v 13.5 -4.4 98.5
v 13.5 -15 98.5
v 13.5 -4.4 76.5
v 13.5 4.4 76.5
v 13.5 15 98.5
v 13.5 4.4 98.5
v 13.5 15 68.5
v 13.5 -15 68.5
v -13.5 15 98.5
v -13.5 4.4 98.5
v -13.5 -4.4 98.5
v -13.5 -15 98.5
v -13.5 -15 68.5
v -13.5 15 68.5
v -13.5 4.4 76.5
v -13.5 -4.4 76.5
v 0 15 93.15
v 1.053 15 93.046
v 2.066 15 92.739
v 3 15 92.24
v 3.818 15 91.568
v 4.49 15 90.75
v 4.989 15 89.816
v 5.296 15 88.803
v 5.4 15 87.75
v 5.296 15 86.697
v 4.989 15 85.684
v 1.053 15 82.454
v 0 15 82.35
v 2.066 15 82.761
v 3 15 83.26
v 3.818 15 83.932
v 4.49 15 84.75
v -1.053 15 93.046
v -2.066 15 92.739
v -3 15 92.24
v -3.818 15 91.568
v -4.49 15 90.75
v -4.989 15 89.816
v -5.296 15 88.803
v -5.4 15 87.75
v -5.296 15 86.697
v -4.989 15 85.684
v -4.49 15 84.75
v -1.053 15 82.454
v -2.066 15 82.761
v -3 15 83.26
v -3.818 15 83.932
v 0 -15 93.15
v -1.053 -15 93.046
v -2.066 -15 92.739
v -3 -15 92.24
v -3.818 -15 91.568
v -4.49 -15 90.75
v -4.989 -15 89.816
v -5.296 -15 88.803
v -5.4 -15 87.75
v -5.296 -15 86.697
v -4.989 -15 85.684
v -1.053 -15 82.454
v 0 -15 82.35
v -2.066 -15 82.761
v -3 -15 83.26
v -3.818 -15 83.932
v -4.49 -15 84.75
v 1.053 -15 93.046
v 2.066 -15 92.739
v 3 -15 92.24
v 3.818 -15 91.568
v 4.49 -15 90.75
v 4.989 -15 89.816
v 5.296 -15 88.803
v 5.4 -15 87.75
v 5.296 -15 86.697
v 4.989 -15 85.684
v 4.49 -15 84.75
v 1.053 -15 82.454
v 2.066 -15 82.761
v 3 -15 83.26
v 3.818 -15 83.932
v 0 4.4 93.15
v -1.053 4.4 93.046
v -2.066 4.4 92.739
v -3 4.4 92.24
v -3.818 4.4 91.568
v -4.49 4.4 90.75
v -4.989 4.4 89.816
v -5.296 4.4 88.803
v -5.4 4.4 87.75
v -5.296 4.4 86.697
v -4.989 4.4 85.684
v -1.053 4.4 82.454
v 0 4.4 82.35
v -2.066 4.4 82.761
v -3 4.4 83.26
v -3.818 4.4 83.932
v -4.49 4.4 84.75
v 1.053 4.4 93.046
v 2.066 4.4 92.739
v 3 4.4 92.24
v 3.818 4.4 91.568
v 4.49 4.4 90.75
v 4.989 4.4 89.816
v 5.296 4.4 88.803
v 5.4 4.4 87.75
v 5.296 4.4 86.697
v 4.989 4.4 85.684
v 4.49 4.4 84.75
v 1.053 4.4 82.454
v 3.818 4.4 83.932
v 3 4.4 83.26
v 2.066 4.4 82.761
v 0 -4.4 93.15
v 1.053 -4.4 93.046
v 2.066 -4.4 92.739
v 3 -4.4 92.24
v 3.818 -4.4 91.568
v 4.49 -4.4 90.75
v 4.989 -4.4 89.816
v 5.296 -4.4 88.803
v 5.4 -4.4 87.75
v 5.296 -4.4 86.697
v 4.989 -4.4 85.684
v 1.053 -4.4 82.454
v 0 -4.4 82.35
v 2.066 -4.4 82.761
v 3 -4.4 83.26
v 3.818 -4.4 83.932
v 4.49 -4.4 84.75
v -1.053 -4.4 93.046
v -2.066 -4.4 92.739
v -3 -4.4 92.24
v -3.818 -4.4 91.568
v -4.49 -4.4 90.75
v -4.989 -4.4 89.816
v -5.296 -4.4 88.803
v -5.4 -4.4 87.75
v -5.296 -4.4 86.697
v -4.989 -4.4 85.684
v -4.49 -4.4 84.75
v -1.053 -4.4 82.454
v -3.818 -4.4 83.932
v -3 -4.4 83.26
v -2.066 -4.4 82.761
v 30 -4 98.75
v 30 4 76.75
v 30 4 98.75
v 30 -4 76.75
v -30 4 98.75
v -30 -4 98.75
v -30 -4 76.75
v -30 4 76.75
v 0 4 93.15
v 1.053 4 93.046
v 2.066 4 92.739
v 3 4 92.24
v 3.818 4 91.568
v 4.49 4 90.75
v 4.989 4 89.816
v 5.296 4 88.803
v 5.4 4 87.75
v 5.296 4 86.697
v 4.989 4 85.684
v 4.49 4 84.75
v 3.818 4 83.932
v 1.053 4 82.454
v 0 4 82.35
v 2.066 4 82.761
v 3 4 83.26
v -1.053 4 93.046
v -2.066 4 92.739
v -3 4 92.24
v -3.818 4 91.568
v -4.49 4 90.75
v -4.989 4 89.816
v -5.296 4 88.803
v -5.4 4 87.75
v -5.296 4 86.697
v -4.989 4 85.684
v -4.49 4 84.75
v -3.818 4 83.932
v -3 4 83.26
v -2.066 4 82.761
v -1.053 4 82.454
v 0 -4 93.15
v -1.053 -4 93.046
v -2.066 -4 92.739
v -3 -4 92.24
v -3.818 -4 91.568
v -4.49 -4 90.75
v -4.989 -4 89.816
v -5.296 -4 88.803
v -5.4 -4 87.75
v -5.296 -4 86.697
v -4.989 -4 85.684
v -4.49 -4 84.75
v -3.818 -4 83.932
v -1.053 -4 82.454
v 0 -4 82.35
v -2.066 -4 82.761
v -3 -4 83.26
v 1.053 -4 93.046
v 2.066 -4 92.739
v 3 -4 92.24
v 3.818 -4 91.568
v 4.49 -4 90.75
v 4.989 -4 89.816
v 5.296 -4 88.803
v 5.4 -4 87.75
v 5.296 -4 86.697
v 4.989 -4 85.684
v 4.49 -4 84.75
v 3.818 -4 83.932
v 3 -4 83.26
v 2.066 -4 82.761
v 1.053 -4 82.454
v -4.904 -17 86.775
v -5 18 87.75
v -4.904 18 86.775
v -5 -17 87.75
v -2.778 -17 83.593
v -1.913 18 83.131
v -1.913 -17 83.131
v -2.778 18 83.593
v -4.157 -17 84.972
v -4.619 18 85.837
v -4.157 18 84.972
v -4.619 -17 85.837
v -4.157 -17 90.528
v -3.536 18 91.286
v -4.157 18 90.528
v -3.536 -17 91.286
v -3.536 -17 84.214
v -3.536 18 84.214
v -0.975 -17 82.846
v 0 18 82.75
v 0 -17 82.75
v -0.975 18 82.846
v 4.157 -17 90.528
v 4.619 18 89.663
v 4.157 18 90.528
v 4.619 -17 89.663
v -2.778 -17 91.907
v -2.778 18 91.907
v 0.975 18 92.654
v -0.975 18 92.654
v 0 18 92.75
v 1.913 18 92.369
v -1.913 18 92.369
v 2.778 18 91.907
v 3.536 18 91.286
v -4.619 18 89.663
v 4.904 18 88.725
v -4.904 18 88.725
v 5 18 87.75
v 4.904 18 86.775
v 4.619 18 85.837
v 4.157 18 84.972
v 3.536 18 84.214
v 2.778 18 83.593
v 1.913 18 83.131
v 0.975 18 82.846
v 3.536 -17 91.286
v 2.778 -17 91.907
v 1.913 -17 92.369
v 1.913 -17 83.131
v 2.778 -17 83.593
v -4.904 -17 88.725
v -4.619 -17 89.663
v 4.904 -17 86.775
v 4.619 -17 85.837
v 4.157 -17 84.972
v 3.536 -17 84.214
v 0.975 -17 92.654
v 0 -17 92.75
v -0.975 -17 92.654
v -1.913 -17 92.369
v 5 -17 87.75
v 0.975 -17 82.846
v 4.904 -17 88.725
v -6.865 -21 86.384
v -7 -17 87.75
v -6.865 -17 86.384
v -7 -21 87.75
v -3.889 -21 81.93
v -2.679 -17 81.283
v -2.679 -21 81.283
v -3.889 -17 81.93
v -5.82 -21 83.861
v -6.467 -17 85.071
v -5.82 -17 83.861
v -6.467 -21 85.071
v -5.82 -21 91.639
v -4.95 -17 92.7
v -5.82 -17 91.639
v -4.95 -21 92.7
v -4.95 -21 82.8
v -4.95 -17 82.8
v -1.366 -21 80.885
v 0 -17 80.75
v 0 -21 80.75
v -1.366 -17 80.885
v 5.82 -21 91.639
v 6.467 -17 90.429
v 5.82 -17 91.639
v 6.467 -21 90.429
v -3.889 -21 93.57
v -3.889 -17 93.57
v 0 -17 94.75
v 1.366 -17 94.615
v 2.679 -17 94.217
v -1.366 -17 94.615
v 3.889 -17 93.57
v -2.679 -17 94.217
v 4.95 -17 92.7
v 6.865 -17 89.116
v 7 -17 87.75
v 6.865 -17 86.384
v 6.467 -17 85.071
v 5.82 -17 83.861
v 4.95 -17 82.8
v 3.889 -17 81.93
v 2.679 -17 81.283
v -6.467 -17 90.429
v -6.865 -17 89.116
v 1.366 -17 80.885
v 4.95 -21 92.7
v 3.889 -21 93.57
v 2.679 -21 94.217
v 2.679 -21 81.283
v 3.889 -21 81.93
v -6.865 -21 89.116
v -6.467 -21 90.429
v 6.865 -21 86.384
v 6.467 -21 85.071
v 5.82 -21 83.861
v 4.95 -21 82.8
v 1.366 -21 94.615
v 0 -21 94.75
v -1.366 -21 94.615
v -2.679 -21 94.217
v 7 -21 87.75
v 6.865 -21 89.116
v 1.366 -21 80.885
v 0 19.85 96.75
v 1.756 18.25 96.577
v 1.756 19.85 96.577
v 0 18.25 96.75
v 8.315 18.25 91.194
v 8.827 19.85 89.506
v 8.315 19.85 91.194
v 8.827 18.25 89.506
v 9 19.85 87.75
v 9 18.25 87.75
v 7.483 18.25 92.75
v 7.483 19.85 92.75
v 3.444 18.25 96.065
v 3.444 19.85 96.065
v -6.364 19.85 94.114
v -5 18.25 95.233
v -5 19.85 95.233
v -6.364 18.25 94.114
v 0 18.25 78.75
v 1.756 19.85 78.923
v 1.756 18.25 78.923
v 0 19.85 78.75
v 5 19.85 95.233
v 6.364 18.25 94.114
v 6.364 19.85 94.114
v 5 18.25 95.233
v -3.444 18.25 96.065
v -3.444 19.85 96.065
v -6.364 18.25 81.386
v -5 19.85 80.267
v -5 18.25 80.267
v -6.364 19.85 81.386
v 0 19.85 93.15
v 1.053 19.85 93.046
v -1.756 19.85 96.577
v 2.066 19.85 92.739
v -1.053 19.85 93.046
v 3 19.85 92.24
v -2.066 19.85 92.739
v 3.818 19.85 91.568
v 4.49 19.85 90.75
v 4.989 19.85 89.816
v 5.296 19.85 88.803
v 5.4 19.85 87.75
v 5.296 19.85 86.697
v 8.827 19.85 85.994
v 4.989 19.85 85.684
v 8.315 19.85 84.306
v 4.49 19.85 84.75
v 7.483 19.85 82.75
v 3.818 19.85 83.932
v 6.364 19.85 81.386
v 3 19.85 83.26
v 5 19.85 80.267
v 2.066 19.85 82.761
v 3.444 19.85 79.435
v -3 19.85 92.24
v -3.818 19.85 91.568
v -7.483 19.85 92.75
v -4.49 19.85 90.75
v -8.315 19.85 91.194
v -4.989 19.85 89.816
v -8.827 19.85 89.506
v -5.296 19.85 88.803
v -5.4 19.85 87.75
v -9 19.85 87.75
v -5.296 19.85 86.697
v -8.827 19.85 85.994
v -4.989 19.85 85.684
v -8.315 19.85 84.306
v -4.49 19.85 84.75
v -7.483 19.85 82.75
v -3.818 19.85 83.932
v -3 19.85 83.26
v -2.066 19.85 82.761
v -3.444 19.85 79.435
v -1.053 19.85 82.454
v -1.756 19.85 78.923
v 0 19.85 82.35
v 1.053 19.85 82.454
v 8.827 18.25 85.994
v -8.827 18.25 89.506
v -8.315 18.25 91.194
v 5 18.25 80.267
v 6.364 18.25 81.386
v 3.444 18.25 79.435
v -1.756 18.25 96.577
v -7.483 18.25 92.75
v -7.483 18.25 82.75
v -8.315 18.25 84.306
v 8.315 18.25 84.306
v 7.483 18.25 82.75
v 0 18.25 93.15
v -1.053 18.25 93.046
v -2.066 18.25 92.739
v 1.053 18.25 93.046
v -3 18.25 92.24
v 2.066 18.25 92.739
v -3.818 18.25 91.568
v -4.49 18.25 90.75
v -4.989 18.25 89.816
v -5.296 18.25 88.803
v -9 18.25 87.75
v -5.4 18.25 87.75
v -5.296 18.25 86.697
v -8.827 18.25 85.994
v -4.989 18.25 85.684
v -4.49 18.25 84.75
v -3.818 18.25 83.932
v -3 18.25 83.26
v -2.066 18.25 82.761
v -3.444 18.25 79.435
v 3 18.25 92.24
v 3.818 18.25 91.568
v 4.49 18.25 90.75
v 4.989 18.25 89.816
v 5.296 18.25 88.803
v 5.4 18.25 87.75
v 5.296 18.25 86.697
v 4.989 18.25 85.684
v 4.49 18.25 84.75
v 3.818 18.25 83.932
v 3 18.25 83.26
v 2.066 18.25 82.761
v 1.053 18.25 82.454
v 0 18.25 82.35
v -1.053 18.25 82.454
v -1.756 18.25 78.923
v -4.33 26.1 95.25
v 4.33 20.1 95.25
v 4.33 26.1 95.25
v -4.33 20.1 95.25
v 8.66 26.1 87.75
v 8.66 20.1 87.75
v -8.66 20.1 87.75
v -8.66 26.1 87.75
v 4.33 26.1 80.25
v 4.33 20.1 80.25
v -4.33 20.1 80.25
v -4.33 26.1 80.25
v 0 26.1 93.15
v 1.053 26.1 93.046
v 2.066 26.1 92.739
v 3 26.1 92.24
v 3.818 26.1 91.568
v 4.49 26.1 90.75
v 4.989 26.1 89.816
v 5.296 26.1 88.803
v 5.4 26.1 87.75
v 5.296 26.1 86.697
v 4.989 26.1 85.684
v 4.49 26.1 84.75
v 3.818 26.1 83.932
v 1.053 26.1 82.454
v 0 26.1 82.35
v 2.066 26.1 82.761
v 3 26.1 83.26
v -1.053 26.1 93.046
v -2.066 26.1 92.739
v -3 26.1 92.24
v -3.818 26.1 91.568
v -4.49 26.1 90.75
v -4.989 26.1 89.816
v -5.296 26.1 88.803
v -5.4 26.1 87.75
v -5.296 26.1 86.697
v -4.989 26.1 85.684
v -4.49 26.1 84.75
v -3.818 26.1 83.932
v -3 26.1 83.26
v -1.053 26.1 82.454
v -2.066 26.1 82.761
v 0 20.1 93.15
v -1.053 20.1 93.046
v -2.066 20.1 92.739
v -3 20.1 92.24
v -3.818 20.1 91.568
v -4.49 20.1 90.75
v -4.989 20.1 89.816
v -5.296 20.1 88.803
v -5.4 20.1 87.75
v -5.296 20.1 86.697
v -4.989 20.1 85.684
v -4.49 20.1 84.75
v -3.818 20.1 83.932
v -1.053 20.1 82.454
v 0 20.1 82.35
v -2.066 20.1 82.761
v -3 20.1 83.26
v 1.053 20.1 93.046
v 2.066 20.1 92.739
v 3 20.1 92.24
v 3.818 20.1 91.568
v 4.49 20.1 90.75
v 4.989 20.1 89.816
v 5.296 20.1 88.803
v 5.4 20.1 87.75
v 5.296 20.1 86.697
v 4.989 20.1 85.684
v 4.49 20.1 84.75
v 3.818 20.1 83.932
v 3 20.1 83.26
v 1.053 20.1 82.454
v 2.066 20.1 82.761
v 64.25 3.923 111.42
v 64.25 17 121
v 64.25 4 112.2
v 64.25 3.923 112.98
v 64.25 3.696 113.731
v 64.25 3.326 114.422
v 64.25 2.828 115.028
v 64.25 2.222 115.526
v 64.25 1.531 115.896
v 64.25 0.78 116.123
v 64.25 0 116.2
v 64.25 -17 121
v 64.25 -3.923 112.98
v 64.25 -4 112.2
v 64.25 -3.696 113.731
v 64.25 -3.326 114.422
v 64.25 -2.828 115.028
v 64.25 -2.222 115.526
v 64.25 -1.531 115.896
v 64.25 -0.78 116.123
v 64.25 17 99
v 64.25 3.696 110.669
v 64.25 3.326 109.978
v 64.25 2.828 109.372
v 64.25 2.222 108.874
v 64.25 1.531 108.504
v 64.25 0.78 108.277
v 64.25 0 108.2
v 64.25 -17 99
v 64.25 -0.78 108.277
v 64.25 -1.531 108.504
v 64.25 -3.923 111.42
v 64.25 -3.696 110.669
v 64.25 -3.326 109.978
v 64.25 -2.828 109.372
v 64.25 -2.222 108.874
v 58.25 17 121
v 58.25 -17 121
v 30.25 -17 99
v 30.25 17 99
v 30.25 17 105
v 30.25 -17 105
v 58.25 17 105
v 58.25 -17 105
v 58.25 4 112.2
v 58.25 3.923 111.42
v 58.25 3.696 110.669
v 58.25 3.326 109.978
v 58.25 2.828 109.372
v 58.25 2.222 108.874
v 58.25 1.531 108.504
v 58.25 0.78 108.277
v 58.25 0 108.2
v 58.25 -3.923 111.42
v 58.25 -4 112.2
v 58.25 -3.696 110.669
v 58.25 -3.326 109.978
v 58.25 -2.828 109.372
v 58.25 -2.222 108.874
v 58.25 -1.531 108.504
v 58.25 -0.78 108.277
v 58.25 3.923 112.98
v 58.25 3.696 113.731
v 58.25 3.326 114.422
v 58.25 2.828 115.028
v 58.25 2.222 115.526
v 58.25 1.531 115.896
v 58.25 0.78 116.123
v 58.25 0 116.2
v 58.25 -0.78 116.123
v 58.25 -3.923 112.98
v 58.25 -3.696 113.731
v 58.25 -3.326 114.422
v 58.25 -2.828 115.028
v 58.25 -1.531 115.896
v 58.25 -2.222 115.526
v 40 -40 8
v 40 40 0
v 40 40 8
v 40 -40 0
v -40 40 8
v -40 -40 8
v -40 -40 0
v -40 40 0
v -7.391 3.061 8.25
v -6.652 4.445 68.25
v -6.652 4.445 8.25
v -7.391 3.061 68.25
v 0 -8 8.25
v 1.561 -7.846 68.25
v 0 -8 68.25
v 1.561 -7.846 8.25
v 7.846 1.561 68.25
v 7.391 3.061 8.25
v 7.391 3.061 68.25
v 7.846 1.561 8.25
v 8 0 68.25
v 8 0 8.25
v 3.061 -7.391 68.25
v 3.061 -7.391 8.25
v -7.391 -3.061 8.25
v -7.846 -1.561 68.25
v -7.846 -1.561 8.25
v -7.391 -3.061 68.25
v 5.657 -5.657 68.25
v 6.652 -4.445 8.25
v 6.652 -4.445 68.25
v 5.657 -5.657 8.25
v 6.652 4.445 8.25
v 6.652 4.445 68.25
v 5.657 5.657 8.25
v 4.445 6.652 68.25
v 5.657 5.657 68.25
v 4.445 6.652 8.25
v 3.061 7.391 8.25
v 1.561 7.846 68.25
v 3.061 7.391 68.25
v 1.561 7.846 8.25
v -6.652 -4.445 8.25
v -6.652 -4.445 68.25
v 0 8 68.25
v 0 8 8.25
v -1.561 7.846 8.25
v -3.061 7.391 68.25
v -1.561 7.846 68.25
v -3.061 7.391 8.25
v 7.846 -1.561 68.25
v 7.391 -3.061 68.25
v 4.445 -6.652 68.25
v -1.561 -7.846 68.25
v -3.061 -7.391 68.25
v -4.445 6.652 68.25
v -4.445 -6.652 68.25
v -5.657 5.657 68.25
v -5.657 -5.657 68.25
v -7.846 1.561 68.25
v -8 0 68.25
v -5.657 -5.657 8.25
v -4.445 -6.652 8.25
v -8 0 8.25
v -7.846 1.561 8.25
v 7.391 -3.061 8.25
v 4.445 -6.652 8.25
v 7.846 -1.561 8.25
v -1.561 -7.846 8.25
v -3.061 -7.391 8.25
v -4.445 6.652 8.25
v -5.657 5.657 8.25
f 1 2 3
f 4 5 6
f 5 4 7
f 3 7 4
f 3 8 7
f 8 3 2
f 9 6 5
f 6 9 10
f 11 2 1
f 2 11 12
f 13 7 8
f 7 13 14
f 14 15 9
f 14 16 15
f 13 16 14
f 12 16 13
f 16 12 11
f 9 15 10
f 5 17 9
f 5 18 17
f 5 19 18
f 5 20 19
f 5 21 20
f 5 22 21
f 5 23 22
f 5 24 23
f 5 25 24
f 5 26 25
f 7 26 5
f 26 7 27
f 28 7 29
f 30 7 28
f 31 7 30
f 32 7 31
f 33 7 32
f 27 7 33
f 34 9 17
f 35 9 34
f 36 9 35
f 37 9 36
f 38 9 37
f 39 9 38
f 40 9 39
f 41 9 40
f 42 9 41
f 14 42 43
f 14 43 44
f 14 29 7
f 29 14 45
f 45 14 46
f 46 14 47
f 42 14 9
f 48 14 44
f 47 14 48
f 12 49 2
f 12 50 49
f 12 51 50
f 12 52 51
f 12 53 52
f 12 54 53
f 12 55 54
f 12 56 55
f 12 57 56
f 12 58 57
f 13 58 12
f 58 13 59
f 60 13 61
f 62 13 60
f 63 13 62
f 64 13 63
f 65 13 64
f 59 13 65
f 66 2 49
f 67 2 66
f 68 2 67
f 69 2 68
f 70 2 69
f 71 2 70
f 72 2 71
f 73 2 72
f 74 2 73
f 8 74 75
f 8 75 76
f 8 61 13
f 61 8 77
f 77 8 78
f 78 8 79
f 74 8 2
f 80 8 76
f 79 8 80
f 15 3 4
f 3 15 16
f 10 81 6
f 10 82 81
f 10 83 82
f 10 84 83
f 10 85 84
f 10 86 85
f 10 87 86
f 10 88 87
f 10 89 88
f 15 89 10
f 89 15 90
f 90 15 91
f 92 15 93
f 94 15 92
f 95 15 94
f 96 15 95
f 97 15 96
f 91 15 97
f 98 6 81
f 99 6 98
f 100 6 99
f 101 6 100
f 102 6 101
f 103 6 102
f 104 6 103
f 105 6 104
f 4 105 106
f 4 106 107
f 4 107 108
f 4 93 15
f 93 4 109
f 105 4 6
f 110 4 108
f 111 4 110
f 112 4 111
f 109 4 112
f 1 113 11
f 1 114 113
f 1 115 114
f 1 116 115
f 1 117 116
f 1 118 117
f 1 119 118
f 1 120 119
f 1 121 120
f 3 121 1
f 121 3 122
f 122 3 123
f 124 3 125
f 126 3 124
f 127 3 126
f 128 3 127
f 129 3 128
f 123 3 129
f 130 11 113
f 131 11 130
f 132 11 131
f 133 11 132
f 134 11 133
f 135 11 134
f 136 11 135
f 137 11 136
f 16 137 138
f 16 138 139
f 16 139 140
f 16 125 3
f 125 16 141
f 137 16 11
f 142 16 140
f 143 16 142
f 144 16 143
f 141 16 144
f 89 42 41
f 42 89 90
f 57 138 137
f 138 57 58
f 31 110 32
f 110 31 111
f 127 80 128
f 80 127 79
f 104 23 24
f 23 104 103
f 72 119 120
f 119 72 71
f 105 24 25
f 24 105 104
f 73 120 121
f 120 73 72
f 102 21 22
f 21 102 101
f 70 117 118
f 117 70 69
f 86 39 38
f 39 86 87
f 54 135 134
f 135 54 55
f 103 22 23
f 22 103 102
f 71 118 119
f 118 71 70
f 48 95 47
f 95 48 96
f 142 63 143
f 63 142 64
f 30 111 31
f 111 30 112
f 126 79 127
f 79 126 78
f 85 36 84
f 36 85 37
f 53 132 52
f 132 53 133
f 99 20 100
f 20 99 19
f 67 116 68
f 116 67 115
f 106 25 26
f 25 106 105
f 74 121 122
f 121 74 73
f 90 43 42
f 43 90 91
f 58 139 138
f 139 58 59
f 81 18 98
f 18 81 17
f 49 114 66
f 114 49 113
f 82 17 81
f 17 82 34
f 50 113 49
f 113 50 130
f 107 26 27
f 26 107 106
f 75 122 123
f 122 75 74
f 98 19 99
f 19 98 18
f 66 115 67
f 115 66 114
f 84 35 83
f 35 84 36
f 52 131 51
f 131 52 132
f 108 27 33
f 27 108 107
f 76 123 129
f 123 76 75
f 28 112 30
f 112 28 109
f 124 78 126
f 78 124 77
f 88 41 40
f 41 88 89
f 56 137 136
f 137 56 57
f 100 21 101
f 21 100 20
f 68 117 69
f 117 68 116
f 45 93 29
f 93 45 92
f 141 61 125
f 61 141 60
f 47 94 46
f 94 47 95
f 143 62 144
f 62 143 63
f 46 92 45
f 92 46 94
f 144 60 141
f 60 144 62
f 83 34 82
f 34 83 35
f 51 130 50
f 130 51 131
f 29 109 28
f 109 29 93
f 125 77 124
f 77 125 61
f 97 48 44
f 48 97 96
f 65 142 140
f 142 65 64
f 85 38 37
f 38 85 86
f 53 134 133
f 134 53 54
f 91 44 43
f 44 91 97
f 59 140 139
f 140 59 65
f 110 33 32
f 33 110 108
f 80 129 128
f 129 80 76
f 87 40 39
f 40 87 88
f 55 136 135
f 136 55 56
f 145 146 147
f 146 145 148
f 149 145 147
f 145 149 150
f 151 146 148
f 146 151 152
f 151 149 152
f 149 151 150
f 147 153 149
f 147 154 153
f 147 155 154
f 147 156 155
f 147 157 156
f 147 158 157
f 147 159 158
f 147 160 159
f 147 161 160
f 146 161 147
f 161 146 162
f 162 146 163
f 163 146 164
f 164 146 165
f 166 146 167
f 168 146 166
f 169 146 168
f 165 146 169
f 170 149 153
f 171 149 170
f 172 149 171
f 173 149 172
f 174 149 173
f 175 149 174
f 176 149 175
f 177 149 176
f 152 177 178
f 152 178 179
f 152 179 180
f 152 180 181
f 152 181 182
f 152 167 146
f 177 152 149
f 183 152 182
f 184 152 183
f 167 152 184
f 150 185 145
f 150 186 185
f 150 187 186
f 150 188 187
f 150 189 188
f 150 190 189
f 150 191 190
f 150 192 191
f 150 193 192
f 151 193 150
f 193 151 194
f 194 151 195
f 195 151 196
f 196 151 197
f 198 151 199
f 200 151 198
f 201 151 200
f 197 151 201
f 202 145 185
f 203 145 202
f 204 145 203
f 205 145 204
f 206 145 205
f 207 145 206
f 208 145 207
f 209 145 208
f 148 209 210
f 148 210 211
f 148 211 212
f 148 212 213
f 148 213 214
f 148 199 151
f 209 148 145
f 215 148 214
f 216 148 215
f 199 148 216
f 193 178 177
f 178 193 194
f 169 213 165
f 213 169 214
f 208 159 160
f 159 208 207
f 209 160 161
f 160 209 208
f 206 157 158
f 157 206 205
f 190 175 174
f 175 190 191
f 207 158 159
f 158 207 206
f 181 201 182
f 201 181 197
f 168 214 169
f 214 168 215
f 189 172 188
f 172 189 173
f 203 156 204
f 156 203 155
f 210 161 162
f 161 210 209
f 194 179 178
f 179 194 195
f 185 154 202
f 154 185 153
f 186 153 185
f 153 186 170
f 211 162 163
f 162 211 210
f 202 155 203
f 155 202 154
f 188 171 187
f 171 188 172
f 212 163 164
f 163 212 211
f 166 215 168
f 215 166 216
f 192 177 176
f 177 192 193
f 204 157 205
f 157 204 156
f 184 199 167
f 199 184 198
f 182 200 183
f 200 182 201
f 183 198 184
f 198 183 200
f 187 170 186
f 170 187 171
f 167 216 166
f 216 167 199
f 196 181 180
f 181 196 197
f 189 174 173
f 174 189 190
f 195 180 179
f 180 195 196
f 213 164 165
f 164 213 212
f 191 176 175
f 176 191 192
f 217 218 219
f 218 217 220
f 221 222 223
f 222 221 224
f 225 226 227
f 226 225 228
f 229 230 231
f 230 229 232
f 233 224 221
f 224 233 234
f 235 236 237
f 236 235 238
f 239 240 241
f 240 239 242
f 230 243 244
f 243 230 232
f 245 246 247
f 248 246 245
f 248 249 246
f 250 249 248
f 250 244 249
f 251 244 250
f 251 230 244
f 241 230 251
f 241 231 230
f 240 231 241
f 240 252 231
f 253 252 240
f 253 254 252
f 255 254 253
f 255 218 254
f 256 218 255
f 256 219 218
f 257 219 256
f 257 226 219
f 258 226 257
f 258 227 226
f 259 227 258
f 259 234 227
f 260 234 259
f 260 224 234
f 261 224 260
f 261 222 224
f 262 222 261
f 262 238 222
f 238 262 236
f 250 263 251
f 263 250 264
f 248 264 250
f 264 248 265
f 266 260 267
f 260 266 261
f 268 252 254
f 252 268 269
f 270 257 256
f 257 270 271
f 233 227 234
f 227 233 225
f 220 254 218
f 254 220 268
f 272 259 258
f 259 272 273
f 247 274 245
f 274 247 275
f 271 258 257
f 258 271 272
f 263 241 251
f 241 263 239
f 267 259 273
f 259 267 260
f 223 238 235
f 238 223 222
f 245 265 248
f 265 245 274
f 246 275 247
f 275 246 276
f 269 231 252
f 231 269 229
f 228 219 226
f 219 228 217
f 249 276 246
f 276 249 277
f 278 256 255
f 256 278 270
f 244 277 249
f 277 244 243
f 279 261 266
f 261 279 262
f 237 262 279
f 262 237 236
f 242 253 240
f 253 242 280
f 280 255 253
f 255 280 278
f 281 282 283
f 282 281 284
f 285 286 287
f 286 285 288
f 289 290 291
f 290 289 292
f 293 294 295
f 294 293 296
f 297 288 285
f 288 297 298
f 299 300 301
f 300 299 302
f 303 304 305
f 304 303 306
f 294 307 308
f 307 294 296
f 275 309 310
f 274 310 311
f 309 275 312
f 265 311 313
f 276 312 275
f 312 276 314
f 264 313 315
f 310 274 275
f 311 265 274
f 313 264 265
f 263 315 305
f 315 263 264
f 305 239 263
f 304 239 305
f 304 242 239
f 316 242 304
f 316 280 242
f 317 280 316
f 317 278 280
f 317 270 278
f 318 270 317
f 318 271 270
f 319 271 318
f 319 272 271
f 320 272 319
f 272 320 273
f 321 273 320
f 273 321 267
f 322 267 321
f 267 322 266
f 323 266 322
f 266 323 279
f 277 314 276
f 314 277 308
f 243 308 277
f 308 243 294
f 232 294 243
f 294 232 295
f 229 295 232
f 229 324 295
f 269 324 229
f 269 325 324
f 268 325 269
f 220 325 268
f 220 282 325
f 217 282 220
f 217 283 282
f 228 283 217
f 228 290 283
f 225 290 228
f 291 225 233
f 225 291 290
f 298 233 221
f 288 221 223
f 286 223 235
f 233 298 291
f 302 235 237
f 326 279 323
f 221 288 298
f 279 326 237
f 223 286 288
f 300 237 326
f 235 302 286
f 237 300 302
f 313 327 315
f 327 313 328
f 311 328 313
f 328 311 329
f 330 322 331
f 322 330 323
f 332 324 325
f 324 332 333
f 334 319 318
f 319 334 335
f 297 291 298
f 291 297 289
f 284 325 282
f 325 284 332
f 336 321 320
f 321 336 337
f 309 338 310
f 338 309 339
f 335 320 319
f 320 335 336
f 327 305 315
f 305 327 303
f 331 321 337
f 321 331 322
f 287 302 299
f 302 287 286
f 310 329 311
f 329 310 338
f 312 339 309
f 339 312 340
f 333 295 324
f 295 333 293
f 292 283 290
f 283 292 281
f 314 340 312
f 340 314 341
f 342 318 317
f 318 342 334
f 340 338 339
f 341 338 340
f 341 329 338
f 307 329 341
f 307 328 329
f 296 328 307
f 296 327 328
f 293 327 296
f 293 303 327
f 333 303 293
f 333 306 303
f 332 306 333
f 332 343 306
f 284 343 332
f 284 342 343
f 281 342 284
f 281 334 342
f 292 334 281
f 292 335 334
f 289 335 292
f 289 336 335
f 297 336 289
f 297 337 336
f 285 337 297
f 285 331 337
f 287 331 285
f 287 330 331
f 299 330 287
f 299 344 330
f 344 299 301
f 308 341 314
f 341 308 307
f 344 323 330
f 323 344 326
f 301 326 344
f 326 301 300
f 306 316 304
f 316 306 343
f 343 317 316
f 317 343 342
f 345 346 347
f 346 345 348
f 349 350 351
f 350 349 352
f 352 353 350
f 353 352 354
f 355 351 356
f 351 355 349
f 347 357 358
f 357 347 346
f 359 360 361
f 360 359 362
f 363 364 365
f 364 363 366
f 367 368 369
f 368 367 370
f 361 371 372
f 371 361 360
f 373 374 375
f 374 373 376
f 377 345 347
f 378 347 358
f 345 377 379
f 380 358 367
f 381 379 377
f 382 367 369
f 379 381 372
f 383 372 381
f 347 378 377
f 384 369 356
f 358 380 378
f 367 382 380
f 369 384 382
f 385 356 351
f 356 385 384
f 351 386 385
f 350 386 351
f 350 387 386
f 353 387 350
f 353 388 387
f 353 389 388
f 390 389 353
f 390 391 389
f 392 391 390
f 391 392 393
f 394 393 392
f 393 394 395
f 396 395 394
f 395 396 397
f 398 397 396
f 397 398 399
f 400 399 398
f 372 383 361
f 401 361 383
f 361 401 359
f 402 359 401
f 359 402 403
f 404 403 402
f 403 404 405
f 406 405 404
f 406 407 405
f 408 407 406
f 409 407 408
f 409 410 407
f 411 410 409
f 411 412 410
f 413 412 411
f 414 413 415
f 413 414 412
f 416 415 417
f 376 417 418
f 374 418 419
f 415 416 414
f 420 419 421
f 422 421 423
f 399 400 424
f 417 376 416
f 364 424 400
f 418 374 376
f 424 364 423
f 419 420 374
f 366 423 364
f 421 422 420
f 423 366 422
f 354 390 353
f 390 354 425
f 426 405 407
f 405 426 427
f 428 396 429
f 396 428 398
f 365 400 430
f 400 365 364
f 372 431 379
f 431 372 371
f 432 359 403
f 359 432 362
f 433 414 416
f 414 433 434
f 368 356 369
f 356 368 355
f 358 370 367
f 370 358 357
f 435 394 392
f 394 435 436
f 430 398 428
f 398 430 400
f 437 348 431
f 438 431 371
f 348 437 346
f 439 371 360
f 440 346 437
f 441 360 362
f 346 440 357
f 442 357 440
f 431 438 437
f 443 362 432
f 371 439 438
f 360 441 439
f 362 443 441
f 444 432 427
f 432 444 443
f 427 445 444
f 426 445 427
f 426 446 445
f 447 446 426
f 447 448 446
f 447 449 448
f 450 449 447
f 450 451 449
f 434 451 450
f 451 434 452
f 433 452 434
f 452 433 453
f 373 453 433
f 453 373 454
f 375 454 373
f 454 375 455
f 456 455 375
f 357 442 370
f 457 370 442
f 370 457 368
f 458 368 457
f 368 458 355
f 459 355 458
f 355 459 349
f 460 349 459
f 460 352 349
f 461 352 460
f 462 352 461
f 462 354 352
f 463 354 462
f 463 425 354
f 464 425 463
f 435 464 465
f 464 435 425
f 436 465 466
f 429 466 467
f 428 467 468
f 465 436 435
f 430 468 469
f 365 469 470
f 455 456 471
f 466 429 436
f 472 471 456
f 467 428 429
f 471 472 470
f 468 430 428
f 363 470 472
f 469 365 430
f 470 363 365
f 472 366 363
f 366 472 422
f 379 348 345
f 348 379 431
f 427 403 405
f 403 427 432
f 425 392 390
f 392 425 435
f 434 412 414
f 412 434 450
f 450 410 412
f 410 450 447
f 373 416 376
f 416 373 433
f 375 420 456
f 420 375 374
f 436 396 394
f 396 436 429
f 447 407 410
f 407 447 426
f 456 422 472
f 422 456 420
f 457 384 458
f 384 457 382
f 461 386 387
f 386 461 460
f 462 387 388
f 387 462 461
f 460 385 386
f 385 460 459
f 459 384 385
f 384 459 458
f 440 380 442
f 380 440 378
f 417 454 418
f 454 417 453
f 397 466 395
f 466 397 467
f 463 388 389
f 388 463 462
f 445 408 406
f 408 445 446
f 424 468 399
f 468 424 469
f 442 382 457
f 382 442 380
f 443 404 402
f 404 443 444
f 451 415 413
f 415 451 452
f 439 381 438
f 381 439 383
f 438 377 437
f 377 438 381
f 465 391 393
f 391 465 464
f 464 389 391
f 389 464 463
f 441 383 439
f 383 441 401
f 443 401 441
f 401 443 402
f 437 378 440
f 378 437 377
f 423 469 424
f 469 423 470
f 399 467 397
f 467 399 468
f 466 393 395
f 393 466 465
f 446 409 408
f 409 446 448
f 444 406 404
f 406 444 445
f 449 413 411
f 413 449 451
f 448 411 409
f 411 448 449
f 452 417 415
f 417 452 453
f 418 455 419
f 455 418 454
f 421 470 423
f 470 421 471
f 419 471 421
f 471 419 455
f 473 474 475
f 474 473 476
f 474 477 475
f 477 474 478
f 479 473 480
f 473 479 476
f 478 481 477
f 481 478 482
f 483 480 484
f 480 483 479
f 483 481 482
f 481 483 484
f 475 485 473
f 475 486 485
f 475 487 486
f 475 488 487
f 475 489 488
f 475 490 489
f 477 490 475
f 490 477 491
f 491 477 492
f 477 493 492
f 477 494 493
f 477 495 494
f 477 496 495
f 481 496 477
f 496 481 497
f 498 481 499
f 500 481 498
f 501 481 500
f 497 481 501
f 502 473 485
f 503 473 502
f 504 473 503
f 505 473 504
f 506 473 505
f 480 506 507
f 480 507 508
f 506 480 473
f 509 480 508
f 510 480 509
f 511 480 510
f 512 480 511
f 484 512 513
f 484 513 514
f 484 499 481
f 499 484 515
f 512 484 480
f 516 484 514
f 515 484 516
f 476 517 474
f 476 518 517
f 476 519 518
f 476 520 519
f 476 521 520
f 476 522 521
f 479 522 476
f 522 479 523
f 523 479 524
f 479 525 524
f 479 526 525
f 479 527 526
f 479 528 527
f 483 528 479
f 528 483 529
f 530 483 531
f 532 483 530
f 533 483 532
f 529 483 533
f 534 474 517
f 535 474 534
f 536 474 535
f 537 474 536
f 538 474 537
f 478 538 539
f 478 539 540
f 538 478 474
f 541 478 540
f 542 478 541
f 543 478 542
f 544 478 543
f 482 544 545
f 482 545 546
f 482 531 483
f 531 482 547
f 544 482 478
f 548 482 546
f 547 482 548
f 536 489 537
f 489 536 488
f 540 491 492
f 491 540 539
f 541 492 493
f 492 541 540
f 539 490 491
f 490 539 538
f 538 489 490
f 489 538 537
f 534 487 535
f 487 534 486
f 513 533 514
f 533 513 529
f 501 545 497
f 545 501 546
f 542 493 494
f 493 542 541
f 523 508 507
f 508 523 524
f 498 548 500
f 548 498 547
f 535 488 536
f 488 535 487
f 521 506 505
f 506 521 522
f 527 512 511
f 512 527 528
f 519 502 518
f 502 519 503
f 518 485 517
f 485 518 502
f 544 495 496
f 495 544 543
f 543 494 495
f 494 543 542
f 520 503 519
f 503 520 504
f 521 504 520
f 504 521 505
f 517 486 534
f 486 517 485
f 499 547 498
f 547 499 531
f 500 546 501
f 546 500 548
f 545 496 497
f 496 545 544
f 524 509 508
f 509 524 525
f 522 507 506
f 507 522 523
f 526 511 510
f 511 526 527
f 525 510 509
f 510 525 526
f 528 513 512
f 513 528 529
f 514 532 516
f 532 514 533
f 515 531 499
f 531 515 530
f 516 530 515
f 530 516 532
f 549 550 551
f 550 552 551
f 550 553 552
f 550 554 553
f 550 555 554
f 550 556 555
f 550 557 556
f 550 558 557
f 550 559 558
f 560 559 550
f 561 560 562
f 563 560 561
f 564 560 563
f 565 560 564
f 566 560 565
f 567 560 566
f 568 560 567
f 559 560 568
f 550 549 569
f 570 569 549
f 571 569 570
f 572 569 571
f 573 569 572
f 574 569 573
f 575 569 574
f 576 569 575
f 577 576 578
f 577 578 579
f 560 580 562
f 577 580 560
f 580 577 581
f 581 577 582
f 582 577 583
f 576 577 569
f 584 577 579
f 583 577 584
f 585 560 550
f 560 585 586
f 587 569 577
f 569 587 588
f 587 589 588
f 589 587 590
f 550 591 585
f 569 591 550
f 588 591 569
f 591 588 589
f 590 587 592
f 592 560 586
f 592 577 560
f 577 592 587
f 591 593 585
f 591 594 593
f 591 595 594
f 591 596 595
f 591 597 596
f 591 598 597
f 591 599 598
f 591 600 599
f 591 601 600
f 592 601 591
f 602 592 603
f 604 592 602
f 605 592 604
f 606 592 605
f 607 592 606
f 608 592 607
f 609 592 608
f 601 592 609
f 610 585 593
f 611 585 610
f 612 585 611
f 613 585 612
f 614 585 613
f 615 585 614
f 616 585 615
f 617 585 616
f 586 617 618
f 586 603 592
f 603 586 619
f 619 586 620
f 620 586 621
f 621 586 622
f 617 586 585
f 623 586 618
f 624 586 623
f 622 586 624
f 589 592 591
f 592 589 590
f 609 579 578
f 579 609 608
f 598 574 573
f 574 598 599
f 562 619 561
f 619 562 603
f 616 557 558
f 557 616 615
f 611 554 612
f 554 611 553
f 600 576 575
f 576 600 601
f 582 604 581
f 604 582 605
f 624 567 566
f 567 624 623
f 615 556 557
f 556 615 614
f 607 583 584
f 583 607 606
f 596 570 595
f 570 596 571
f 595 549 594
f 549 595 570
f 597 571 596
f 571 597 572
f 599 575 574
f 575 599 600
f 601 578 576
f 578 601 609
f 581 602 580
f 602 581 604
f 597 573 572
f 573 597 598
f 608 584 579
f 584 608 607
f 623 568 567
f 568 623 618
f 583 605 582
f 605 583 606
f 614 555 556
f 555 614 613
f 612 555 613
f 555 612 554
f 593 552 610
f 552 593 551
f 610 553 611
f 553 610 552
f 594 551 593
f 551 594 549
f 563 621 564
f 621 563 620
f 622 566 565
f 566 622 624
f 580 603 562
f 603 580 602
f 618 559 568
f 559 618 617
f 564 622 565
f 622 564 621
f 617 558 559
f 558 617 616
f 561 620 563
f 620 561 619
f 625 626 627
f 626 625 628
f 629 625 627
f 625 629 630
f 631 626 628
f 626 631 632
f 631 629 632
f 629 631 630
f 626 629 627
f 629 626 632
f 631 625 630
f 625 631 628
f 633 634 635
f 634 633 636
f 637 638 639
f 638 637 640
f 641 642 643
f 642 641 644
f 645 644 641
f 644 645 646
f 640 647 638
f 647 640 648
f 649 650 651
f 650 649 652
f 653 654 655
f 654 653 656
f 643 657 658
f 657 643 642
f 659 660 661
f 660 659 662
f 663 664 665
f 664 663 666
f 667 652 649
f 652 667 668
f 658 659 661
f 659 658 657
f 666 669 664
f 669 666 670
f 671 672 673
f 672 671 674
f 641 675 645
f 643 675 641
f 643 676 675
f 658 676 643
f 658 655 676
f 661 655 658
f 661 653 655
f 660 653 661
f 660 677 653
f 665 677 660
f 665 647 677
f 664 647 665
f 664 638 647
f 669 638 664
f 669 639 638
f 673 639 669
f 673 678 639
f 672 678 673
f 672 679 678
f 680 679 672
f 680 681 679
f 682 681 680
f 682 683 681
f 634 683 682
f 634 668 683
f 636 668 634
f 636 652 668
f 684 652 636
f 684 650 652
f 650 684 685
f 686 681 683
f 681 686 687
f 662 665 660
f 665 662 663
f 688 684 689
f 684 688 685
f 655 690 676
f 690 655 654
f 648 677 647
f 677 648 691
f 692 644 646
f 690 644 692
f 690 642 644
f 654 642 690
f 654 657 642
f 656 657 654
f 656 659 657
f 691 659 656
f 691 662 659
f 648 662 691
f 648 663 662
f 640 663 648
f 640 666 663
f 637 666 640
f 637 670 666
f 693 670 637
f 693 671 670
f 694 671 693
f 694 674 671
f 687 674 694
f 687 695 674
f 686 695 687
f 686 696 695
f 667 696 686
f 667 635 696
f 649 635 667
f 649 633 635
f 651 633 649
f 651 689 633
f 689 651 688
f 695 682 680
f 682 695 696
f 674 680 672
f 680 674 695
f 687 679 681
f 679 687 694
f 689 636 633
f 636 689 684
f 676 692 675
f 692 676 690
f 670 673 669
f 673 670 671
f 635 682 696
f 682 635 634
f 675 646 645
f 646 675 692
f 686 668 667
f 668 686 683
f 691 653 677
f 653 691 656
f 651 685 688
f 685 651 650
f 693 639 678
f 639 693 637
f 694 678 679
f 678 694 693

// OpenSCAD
$fn = 32;

// ------------------------------------------------------------------------
// Lamp arm: column d16 x 60 mm, arm 60 mm
// Every part is its own module, assembly() places every instance.
// ------------------------------------------------------------------------

// --- part 1 ---
module lamp_base() {
  difference() {
    translate([-40, -40, 0]) cube([80, 80, 8]);
  }
}

// --- part 2 ---
module lamp_column() {
  cylinder(h = 60, d = 16);
}

// --- part 3 ---
module head_fork() {
  difference() {
    translate([-13.5, -15, 0]) cube([27, 30, 30]);
    translate([-14.5, -4.4, 8]) cube([29, 8.8, 23]);
    translate([0, 0, 19.25]) rotate([90, 0, 0]) cylinder(h = 32, d = 10.8, center = true);
  }
}

// --- part 4 ---
module lamp_arm() {
  difference() {
    translate([-30, -4, 0]) cube([60, 8, 22]);
    translate([0, 0, 11]) rotate([90, 0, 0]) cylinder(h = 10, d = 10.8, center = true);
  }
}

// --- part 5 ---
module arm_pin() {
  rotate([0, 90, 0]) cylinder(h = 36, d = 10, center = true);
  translate([-21, 0, 0]) rotate([0, 90, 0]) cylinder(h = 4, d = 14);
}

// --- part 6 ---
module arm_washer() {
  difference() {
      translate([0, 0, 0]) cylinder(h = 1.6, d = 18);
      translate([0, 0, -1]) cylinder(h = 3.6, d = 10.8);
    }
}

// --- part 7 ---
module arm_nut() {
  difference() {
    linear_extrude(height = 6) polygon(points = [[8.66, 0], [4.33, 7.5], [-4.33, 7.5], [-8.66, 0], [-4.33, -7.5], [4.33, -7.5]]);
    translate([0, 0, -1]) cylinder(h = 8, d = 10.8);
  }
}

// --- part 8 ---
module shade_bracket() {
  difference() {
    translate([-17, -17, 0]) cube([34, 34, 22]);
    translate([-18, -18, 6]) cube([29, 36, 17]);
    translate([14, 0, 13.2]) rotate([0, 90, 0]) cylinder(h = 8, d = 8, center = true);
  }
}

// --- assembly ---
module assembly() {
  color([0.80, 0.24, 0.20]) translate([0, 0, 0]) rotate([0, 0, 0]) lamp_base();
  color([0.20, 0.45, 0.75]) translate([0, 0, 8.25]) rotate([0, 0, 0]) lamp_column();
  color([0.25, 0.62, 0.32]) translate([0, 0, 68.5]) rotate([0, 0, 0]) head_fork();
  color([0.92, 0.70, 0.18]) translate([0, 0, 76.75]) rotate([0, 0, 0]) lamp_arm();
  color([0.58, 0.35, 0.70]) translate([0, 0, 87.75]) rotate([0, 0, 90]) arm_pin();
  color([0.16, 0.66, 0.66]) translate([0, 19.85, 87.75]) rotate([90, 0, 0]) arm_washer();
  color([0.85, 0.48, 0.18]) translate([0, 26.1, 87.75]) rotate([90, 0, 0]) arm_nut();
  color([0.55, 0.60, 0.65]) translate([47.25, 0, 99]) rotate([0, 0, 0]) shade_bracket();
}

assembly();
